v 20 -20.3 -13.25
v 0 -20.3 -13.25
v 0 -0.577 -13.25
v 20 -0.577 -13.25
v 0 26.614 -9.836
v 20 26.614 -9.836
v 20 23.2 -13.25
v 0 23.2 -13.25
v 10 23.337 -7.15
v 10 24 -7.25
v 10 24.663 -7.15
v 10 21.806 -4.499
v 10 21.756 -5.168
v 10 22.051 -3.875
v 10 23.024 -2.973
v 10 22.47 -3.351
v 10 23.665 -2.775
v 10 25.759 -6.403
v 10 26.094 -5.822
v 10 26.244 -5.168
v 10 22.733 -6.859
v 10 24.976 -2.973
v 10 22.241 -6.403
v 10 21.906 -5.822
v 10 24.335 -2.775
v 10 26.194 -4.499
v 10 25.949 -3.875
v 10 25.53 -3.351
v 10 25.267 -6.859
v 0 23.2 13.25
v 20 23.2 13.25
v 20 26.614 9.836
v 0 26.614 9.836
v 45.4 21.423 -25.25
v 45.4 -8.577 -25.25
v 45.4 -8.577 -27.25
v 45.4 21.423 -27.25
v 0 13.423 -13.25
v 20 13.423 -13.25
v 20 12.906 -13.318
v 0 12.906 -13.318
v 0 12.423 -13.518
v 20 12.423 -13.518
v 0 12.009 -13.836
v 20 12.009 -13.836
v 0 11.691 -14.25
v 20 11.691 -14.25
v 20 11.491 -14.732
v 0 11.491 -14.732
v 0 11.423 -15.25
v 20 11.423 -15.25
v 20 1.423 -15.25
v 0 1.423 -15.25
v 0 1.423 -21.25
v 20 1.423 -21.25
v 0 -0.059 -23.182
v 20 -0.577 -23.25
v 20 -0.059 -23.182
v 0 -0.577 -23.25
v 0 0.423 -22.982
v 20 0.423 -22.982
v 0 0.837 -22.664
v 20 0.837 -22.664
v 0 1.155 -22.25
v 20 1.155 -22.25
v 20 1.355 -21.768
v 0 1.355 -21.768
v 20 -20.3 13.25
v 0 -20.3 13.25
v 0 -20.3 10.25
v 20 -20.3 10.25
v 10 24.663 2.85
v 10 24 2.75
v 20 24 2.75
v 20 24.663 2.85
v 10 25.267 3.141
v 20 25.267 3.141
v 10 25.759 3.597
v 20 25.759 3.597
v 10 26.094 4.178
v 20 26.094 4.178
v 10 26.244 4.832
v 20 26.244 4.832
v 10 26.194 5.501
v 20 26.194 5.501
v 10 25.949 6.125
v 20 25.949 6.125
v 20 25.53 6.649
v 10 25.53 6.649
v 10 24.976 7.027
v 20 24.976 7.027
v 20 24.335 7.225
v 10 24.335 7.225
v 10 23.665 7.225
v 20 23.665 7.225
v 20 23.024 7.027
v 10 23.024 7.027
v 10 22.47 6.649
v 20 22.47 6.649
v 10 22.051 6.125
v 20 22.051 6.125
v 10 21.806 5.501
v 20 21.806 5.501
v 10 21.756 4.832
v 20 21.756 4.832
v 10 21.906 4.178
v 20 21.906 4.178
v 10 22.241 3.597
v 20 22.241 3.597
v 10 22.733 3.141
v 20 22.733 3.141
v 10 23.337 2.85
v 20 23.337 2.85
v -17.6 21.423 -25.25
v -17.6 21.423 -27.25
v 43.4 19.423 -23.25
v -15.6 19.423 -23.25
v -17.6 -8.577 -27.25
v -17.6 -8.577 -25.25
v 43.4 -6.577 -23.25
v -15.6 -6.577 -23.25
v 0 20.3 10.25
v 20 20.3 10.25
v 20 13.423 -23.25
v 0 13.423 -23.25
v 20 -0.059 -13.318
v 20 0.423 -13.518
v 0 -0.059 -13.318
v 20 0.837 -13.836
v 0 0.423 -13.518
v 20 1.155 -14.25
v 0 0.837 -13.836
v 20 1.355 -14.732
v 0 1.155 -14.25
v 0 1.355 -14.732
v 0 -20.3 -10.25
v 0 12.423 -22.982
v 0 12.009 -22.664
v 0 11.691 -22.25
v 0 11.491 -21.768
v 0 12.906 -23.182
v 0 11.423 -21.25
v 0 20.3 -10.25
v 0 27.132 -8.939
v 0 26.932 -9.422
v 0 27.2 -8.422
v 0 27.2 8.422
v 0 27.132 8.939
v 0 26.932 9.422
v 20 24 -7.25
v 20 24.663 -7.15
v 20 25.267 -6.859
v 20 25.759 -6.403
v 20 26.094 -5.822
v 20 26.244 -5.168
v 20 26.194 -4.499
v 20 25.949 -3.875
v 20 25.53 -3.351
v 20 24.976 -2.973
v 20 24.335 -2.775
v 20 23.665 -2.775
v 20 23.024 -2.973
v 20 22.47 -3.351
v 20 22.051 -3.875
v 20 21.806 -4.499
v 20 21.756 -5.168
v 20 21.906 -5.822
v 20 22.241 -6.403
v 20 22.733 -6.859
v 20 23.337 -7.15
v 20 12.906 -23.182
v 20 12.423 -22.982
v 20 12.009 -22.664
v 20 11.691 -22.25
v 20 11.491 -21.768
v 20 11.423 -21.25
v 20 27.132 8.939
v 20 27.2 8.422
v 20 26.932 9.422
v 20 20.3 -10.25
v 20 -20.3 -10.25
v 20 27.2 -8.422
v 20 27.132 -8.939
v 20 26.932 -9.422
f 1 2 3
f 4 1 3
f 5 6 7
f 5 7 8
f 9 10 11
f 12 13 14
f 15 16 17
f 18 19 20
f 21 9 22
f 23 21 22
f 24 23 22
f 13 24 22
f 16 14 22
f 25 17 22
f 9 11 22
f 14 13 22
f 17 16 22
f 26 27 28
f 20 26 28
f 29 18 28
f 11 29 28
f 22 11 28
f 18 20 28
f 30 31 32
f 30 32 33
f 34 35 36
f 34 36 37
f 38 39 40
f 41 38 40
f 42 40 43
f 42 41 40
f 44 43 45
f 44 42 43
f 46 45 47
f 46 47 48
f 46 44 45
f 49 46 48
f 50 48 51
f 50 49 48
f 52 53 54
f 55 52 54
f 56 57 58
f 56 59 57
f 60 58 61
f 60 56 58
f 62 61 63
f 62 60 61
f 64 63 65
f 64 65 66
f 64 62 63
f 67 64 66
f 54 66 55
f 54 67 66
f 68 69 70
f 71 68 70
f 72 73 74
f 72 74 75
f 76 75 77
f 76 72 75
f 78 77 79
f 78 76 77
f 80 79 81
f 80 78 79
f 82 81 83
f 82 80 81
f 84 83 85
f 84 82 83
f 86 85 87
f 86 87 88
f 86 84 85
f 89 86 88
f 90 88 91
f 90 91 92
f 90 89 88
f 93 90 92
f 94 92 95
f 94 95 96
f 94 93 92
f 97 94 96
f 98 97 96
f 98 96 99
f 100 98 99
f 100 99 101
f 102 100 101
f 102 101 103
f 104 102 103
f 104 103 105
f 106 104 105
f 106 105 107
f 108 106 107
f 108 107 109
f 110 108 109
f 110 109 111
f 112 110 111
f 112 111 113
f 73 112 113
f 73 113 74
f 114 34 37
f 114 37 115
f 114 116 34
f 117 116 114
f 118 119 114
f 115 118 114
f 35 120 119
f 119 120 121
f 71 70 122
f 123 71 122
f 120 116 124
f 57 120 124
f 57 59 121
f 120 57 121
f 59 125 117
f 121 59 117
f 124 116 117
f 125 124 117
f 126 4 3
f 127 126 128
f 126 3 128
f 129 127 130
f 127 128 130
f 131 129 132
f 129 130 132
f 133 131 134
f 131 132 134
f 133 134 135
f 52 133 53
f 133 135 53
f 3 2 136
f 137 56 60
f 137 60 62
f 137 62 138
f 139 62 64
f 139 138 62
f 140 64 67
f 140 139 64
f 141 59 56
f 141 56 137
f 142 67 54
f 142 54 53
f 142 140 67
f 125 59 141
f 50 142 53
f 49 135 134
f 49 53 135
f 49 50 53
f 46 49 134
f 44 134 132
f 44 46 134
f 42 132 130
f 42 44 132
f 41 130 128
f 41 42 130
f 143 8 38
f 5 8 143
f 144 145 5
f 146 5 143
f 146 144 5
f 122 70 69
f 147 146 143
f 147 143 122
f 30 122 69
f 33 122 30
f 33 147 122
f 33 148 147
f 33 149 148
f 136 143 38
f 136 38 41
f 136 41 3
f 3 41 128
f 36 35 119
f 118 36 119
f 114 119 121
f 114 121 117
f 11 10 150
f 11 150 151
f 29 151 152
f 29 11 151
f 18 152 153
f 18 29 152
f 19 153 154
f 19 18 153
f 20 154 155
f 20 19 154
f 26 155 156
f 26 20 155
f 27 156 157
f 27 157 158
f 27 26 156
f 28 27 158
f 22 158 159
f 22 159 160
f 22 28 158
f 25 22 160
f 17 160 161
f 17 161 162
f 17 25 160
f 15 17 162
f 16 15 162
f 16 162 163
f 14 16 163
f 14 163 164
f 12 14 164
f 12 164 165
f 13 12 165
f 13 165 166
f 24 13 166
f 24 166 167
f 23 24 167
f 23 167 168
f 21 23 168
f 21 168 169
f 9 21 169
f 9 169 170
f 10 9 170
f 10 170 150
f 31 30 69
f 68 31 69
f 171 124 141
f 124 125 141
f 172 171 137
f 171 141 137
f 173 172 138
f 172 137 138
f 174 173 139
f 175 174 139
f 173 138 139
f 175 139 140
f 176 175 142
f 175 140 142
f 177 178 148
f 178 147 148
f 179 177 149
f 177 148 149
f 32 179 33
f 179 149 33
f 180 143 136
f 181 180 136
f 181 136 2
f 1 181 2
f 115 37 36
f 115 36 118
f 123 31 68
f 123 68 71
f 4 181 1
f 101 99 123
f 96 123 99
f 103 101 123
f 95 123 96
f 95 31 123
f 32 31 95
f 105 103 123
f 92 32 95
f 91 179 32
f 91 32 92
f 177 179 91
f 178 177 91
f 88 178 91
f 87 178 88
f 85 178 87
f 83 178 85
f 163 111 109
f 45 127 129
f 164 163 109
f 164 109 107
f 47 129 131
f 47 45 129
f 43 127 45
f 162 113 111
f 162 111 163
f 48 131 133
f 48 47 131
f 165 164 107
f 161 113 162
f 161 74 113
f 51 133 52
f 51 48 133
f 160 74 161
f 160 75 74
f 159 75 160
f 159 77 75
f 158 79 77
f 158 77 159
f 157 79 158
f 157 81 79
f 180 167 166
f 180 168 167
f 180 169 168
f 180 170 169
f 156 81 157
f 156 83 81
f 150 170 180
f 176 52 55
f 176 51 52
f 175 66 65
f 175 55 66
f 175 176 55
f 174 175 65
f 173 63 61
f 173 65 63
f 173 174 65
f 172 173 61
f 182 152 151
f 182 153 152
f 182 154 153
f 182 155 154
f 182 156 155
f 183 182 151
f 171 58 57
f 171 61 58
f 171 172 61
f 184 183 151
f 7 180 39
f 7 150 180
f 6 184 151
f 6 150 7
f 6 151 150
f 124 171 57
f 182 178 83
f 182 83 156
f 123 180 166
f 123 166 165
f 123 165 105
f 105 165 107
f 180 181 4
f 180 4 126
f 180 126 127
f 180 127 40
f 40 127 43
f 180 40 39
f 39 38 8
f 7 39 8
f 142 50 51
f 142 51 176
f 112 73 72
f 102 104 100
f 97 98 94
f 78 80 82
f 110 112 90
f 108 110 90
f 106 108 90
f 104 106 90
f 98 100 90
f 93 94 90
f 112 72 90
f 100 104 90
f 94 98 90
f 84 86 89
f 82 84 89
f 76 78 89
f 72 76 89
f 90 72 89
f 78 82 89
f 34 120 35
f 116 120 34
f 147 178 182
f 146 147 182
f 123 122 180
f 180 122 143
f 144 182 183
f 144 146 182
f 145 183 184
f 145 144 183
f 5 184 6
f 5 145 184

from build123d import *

# Parameters (mm, degrees)
SKETCH1_R           = 2.25
BOSS_EXTRUDE1_DEPTH = 20
SKETCH2_R           = 2.25
BOSS_EXTRUDE2_DEPTH = 10
SKETCH4_W           = 26.5
SKETCH4_H           = 2.5
CUT_EXTRUDE1_DEPTH  = 39.17921555
CHAMFER2_SIZE       = 4
CHAMFER3_SIZE       = 4
FILLET4_R           = 2
SKETCH7_W           = 10
SKETCH7_H           = 10
BOSS_EXTRUDE5_DEPTH = 20
FILLET6_R           = 2
SKETCH8_W           = 63
SKETCH8_H           = 30
BOSS_EXTRUDE6_DEPTH = 4
CHAMFER4_SIZE       = 2
FILLET7_R           = 2


with BuildPart() as part:
    # Sketch1 → Boss-Extrude1 (new body)
    with BuildSketch(Plane(origin=(0, 0, 0), x_dir=(0, 0, -1), z_dir=(1, 0, 0))):
        Polygon((10.25, -20.3), (13.25, -20.3), (13.25, 29.7), (-13.25, 29.7), (-13.25, -20.3), (-10.25, -20.3), (-10.25, 20.3), (10.25, 20.3), align=None)
        with Locations((5, 24)):
            Circle(SKETCH1_R, mode=Mode.SUBTRACT)
        with Locations((-5, 24)):
            Circle(SKETCH1_R, mode=Mode.SUBTRACT)
    extrude(amount=BOSS_EXTRUDE1_DEPTH)

    # Sketch2 → Boss-Extrude2 (add)
    with BuildSketch(Plane.ZY):
        with Locations((-5, 24)):
            Circle(SKETCH2_R)
        with Locations((5, 24)):
            Circle(SKETCH2_R)
    extrude(amount=-BOSS_EXTRUDE2_DEPTH)

    # Sketch4 → Cut-Extrude1 (cut, through all)
    with BuildSketch(Plane(origin=(20, 0, 0), x_dir=(0, 0, -1), z_dir=(1, 0, 0))):
        with Locations((0, 28.45)):
            Rectangle(SKETCH4_W, SKETCH4_H)
    extrude(amount=-CUT_EXTRUDE1_DEPTH, mode=Mode.SUBTRACT)

    # Chamfer2
    chamfer2_edges = [part.edges().sort_by_distance(p)[0] for p in [
        (10, 27.2, -13.25),
    ]]
    chamfer(chamfer2_edges, length=CHAMFER2_SIZE)

    # Chamfer3
    chamfer3_edges = [part.edges().sort_by_distance(p)[0] for p in [
        (10, 27.2, 13.25),
    ]]
    chamfer(chamfer3_edges, length=CHAMFER3_SIZE)

    # Fillet4
    fillet4_edges = [part.edges().sort_by_distance(p)[0] for p in [
        (10, 27.2, -9.25),
        (10, 27.2, 9.25),
    ]]
    fillet(fillet4_edges, radius=FILLET4_R)

    # Sketch7 → Boss-Extrude5 (add)
    with BuildSketch(Plane(origin=(20, 0, 0), x_dir=(0, 0, -1), z_dir=(1, 0, 0))):
        with Locations((18.25, 6.423218073)):
            Rectangle(SKETCH7_W, SKETCH7_H)
    extrude(amount=-BOSS_EXTRUDE5_DEPTH)

    # Fillet6
    fillet6_edges = [part.edges().sort_by_distance(p)[0] for p in [
        (10, 1.423218073, -13.25),
        (10, 11.423218073, -13.25),
    ]]
    fillet(fillet6_edges, radius=FILLET6_R)

    # Sketch8 → Boss-Extrude6 (add)
    with BuildSketch(Plane(origin=(0, 0, -23.25), x_dir=(-1, 0, 0), z_dir=(0, 0, -1))):
        with Locations((-13.9, 6.423218073)):
            Rectangle(SKETCH8_W, SKETCH8_H)
    extrude(amount=BOSS_EXTRUDE6_DEPTH)

    # Chamfer4
    chamfer4_edges = [part.edges().sort_by_distance(p)[0] for p in [
        (45.4, 6.423218073, -23.25),
        (13.9, -8.576781927, -23.25),
        (-17.6, 6.423218073, -23.25),
        (13.9, 21.423218073, -23.25),
    ]]
    chamfer(chamfer4_edges, length=CHAMFER4_SIZE)

    # Fillet7
    fillet7_edges = [part.edges().sort_by_distance(p)[0] for p in [
        (10, 11.423218073, -23.25),
        (10, 1.423218073, -23.25),
    ]]
    fillet(fillet7_edges, radius=FILLET7_R)


solid = part.part
